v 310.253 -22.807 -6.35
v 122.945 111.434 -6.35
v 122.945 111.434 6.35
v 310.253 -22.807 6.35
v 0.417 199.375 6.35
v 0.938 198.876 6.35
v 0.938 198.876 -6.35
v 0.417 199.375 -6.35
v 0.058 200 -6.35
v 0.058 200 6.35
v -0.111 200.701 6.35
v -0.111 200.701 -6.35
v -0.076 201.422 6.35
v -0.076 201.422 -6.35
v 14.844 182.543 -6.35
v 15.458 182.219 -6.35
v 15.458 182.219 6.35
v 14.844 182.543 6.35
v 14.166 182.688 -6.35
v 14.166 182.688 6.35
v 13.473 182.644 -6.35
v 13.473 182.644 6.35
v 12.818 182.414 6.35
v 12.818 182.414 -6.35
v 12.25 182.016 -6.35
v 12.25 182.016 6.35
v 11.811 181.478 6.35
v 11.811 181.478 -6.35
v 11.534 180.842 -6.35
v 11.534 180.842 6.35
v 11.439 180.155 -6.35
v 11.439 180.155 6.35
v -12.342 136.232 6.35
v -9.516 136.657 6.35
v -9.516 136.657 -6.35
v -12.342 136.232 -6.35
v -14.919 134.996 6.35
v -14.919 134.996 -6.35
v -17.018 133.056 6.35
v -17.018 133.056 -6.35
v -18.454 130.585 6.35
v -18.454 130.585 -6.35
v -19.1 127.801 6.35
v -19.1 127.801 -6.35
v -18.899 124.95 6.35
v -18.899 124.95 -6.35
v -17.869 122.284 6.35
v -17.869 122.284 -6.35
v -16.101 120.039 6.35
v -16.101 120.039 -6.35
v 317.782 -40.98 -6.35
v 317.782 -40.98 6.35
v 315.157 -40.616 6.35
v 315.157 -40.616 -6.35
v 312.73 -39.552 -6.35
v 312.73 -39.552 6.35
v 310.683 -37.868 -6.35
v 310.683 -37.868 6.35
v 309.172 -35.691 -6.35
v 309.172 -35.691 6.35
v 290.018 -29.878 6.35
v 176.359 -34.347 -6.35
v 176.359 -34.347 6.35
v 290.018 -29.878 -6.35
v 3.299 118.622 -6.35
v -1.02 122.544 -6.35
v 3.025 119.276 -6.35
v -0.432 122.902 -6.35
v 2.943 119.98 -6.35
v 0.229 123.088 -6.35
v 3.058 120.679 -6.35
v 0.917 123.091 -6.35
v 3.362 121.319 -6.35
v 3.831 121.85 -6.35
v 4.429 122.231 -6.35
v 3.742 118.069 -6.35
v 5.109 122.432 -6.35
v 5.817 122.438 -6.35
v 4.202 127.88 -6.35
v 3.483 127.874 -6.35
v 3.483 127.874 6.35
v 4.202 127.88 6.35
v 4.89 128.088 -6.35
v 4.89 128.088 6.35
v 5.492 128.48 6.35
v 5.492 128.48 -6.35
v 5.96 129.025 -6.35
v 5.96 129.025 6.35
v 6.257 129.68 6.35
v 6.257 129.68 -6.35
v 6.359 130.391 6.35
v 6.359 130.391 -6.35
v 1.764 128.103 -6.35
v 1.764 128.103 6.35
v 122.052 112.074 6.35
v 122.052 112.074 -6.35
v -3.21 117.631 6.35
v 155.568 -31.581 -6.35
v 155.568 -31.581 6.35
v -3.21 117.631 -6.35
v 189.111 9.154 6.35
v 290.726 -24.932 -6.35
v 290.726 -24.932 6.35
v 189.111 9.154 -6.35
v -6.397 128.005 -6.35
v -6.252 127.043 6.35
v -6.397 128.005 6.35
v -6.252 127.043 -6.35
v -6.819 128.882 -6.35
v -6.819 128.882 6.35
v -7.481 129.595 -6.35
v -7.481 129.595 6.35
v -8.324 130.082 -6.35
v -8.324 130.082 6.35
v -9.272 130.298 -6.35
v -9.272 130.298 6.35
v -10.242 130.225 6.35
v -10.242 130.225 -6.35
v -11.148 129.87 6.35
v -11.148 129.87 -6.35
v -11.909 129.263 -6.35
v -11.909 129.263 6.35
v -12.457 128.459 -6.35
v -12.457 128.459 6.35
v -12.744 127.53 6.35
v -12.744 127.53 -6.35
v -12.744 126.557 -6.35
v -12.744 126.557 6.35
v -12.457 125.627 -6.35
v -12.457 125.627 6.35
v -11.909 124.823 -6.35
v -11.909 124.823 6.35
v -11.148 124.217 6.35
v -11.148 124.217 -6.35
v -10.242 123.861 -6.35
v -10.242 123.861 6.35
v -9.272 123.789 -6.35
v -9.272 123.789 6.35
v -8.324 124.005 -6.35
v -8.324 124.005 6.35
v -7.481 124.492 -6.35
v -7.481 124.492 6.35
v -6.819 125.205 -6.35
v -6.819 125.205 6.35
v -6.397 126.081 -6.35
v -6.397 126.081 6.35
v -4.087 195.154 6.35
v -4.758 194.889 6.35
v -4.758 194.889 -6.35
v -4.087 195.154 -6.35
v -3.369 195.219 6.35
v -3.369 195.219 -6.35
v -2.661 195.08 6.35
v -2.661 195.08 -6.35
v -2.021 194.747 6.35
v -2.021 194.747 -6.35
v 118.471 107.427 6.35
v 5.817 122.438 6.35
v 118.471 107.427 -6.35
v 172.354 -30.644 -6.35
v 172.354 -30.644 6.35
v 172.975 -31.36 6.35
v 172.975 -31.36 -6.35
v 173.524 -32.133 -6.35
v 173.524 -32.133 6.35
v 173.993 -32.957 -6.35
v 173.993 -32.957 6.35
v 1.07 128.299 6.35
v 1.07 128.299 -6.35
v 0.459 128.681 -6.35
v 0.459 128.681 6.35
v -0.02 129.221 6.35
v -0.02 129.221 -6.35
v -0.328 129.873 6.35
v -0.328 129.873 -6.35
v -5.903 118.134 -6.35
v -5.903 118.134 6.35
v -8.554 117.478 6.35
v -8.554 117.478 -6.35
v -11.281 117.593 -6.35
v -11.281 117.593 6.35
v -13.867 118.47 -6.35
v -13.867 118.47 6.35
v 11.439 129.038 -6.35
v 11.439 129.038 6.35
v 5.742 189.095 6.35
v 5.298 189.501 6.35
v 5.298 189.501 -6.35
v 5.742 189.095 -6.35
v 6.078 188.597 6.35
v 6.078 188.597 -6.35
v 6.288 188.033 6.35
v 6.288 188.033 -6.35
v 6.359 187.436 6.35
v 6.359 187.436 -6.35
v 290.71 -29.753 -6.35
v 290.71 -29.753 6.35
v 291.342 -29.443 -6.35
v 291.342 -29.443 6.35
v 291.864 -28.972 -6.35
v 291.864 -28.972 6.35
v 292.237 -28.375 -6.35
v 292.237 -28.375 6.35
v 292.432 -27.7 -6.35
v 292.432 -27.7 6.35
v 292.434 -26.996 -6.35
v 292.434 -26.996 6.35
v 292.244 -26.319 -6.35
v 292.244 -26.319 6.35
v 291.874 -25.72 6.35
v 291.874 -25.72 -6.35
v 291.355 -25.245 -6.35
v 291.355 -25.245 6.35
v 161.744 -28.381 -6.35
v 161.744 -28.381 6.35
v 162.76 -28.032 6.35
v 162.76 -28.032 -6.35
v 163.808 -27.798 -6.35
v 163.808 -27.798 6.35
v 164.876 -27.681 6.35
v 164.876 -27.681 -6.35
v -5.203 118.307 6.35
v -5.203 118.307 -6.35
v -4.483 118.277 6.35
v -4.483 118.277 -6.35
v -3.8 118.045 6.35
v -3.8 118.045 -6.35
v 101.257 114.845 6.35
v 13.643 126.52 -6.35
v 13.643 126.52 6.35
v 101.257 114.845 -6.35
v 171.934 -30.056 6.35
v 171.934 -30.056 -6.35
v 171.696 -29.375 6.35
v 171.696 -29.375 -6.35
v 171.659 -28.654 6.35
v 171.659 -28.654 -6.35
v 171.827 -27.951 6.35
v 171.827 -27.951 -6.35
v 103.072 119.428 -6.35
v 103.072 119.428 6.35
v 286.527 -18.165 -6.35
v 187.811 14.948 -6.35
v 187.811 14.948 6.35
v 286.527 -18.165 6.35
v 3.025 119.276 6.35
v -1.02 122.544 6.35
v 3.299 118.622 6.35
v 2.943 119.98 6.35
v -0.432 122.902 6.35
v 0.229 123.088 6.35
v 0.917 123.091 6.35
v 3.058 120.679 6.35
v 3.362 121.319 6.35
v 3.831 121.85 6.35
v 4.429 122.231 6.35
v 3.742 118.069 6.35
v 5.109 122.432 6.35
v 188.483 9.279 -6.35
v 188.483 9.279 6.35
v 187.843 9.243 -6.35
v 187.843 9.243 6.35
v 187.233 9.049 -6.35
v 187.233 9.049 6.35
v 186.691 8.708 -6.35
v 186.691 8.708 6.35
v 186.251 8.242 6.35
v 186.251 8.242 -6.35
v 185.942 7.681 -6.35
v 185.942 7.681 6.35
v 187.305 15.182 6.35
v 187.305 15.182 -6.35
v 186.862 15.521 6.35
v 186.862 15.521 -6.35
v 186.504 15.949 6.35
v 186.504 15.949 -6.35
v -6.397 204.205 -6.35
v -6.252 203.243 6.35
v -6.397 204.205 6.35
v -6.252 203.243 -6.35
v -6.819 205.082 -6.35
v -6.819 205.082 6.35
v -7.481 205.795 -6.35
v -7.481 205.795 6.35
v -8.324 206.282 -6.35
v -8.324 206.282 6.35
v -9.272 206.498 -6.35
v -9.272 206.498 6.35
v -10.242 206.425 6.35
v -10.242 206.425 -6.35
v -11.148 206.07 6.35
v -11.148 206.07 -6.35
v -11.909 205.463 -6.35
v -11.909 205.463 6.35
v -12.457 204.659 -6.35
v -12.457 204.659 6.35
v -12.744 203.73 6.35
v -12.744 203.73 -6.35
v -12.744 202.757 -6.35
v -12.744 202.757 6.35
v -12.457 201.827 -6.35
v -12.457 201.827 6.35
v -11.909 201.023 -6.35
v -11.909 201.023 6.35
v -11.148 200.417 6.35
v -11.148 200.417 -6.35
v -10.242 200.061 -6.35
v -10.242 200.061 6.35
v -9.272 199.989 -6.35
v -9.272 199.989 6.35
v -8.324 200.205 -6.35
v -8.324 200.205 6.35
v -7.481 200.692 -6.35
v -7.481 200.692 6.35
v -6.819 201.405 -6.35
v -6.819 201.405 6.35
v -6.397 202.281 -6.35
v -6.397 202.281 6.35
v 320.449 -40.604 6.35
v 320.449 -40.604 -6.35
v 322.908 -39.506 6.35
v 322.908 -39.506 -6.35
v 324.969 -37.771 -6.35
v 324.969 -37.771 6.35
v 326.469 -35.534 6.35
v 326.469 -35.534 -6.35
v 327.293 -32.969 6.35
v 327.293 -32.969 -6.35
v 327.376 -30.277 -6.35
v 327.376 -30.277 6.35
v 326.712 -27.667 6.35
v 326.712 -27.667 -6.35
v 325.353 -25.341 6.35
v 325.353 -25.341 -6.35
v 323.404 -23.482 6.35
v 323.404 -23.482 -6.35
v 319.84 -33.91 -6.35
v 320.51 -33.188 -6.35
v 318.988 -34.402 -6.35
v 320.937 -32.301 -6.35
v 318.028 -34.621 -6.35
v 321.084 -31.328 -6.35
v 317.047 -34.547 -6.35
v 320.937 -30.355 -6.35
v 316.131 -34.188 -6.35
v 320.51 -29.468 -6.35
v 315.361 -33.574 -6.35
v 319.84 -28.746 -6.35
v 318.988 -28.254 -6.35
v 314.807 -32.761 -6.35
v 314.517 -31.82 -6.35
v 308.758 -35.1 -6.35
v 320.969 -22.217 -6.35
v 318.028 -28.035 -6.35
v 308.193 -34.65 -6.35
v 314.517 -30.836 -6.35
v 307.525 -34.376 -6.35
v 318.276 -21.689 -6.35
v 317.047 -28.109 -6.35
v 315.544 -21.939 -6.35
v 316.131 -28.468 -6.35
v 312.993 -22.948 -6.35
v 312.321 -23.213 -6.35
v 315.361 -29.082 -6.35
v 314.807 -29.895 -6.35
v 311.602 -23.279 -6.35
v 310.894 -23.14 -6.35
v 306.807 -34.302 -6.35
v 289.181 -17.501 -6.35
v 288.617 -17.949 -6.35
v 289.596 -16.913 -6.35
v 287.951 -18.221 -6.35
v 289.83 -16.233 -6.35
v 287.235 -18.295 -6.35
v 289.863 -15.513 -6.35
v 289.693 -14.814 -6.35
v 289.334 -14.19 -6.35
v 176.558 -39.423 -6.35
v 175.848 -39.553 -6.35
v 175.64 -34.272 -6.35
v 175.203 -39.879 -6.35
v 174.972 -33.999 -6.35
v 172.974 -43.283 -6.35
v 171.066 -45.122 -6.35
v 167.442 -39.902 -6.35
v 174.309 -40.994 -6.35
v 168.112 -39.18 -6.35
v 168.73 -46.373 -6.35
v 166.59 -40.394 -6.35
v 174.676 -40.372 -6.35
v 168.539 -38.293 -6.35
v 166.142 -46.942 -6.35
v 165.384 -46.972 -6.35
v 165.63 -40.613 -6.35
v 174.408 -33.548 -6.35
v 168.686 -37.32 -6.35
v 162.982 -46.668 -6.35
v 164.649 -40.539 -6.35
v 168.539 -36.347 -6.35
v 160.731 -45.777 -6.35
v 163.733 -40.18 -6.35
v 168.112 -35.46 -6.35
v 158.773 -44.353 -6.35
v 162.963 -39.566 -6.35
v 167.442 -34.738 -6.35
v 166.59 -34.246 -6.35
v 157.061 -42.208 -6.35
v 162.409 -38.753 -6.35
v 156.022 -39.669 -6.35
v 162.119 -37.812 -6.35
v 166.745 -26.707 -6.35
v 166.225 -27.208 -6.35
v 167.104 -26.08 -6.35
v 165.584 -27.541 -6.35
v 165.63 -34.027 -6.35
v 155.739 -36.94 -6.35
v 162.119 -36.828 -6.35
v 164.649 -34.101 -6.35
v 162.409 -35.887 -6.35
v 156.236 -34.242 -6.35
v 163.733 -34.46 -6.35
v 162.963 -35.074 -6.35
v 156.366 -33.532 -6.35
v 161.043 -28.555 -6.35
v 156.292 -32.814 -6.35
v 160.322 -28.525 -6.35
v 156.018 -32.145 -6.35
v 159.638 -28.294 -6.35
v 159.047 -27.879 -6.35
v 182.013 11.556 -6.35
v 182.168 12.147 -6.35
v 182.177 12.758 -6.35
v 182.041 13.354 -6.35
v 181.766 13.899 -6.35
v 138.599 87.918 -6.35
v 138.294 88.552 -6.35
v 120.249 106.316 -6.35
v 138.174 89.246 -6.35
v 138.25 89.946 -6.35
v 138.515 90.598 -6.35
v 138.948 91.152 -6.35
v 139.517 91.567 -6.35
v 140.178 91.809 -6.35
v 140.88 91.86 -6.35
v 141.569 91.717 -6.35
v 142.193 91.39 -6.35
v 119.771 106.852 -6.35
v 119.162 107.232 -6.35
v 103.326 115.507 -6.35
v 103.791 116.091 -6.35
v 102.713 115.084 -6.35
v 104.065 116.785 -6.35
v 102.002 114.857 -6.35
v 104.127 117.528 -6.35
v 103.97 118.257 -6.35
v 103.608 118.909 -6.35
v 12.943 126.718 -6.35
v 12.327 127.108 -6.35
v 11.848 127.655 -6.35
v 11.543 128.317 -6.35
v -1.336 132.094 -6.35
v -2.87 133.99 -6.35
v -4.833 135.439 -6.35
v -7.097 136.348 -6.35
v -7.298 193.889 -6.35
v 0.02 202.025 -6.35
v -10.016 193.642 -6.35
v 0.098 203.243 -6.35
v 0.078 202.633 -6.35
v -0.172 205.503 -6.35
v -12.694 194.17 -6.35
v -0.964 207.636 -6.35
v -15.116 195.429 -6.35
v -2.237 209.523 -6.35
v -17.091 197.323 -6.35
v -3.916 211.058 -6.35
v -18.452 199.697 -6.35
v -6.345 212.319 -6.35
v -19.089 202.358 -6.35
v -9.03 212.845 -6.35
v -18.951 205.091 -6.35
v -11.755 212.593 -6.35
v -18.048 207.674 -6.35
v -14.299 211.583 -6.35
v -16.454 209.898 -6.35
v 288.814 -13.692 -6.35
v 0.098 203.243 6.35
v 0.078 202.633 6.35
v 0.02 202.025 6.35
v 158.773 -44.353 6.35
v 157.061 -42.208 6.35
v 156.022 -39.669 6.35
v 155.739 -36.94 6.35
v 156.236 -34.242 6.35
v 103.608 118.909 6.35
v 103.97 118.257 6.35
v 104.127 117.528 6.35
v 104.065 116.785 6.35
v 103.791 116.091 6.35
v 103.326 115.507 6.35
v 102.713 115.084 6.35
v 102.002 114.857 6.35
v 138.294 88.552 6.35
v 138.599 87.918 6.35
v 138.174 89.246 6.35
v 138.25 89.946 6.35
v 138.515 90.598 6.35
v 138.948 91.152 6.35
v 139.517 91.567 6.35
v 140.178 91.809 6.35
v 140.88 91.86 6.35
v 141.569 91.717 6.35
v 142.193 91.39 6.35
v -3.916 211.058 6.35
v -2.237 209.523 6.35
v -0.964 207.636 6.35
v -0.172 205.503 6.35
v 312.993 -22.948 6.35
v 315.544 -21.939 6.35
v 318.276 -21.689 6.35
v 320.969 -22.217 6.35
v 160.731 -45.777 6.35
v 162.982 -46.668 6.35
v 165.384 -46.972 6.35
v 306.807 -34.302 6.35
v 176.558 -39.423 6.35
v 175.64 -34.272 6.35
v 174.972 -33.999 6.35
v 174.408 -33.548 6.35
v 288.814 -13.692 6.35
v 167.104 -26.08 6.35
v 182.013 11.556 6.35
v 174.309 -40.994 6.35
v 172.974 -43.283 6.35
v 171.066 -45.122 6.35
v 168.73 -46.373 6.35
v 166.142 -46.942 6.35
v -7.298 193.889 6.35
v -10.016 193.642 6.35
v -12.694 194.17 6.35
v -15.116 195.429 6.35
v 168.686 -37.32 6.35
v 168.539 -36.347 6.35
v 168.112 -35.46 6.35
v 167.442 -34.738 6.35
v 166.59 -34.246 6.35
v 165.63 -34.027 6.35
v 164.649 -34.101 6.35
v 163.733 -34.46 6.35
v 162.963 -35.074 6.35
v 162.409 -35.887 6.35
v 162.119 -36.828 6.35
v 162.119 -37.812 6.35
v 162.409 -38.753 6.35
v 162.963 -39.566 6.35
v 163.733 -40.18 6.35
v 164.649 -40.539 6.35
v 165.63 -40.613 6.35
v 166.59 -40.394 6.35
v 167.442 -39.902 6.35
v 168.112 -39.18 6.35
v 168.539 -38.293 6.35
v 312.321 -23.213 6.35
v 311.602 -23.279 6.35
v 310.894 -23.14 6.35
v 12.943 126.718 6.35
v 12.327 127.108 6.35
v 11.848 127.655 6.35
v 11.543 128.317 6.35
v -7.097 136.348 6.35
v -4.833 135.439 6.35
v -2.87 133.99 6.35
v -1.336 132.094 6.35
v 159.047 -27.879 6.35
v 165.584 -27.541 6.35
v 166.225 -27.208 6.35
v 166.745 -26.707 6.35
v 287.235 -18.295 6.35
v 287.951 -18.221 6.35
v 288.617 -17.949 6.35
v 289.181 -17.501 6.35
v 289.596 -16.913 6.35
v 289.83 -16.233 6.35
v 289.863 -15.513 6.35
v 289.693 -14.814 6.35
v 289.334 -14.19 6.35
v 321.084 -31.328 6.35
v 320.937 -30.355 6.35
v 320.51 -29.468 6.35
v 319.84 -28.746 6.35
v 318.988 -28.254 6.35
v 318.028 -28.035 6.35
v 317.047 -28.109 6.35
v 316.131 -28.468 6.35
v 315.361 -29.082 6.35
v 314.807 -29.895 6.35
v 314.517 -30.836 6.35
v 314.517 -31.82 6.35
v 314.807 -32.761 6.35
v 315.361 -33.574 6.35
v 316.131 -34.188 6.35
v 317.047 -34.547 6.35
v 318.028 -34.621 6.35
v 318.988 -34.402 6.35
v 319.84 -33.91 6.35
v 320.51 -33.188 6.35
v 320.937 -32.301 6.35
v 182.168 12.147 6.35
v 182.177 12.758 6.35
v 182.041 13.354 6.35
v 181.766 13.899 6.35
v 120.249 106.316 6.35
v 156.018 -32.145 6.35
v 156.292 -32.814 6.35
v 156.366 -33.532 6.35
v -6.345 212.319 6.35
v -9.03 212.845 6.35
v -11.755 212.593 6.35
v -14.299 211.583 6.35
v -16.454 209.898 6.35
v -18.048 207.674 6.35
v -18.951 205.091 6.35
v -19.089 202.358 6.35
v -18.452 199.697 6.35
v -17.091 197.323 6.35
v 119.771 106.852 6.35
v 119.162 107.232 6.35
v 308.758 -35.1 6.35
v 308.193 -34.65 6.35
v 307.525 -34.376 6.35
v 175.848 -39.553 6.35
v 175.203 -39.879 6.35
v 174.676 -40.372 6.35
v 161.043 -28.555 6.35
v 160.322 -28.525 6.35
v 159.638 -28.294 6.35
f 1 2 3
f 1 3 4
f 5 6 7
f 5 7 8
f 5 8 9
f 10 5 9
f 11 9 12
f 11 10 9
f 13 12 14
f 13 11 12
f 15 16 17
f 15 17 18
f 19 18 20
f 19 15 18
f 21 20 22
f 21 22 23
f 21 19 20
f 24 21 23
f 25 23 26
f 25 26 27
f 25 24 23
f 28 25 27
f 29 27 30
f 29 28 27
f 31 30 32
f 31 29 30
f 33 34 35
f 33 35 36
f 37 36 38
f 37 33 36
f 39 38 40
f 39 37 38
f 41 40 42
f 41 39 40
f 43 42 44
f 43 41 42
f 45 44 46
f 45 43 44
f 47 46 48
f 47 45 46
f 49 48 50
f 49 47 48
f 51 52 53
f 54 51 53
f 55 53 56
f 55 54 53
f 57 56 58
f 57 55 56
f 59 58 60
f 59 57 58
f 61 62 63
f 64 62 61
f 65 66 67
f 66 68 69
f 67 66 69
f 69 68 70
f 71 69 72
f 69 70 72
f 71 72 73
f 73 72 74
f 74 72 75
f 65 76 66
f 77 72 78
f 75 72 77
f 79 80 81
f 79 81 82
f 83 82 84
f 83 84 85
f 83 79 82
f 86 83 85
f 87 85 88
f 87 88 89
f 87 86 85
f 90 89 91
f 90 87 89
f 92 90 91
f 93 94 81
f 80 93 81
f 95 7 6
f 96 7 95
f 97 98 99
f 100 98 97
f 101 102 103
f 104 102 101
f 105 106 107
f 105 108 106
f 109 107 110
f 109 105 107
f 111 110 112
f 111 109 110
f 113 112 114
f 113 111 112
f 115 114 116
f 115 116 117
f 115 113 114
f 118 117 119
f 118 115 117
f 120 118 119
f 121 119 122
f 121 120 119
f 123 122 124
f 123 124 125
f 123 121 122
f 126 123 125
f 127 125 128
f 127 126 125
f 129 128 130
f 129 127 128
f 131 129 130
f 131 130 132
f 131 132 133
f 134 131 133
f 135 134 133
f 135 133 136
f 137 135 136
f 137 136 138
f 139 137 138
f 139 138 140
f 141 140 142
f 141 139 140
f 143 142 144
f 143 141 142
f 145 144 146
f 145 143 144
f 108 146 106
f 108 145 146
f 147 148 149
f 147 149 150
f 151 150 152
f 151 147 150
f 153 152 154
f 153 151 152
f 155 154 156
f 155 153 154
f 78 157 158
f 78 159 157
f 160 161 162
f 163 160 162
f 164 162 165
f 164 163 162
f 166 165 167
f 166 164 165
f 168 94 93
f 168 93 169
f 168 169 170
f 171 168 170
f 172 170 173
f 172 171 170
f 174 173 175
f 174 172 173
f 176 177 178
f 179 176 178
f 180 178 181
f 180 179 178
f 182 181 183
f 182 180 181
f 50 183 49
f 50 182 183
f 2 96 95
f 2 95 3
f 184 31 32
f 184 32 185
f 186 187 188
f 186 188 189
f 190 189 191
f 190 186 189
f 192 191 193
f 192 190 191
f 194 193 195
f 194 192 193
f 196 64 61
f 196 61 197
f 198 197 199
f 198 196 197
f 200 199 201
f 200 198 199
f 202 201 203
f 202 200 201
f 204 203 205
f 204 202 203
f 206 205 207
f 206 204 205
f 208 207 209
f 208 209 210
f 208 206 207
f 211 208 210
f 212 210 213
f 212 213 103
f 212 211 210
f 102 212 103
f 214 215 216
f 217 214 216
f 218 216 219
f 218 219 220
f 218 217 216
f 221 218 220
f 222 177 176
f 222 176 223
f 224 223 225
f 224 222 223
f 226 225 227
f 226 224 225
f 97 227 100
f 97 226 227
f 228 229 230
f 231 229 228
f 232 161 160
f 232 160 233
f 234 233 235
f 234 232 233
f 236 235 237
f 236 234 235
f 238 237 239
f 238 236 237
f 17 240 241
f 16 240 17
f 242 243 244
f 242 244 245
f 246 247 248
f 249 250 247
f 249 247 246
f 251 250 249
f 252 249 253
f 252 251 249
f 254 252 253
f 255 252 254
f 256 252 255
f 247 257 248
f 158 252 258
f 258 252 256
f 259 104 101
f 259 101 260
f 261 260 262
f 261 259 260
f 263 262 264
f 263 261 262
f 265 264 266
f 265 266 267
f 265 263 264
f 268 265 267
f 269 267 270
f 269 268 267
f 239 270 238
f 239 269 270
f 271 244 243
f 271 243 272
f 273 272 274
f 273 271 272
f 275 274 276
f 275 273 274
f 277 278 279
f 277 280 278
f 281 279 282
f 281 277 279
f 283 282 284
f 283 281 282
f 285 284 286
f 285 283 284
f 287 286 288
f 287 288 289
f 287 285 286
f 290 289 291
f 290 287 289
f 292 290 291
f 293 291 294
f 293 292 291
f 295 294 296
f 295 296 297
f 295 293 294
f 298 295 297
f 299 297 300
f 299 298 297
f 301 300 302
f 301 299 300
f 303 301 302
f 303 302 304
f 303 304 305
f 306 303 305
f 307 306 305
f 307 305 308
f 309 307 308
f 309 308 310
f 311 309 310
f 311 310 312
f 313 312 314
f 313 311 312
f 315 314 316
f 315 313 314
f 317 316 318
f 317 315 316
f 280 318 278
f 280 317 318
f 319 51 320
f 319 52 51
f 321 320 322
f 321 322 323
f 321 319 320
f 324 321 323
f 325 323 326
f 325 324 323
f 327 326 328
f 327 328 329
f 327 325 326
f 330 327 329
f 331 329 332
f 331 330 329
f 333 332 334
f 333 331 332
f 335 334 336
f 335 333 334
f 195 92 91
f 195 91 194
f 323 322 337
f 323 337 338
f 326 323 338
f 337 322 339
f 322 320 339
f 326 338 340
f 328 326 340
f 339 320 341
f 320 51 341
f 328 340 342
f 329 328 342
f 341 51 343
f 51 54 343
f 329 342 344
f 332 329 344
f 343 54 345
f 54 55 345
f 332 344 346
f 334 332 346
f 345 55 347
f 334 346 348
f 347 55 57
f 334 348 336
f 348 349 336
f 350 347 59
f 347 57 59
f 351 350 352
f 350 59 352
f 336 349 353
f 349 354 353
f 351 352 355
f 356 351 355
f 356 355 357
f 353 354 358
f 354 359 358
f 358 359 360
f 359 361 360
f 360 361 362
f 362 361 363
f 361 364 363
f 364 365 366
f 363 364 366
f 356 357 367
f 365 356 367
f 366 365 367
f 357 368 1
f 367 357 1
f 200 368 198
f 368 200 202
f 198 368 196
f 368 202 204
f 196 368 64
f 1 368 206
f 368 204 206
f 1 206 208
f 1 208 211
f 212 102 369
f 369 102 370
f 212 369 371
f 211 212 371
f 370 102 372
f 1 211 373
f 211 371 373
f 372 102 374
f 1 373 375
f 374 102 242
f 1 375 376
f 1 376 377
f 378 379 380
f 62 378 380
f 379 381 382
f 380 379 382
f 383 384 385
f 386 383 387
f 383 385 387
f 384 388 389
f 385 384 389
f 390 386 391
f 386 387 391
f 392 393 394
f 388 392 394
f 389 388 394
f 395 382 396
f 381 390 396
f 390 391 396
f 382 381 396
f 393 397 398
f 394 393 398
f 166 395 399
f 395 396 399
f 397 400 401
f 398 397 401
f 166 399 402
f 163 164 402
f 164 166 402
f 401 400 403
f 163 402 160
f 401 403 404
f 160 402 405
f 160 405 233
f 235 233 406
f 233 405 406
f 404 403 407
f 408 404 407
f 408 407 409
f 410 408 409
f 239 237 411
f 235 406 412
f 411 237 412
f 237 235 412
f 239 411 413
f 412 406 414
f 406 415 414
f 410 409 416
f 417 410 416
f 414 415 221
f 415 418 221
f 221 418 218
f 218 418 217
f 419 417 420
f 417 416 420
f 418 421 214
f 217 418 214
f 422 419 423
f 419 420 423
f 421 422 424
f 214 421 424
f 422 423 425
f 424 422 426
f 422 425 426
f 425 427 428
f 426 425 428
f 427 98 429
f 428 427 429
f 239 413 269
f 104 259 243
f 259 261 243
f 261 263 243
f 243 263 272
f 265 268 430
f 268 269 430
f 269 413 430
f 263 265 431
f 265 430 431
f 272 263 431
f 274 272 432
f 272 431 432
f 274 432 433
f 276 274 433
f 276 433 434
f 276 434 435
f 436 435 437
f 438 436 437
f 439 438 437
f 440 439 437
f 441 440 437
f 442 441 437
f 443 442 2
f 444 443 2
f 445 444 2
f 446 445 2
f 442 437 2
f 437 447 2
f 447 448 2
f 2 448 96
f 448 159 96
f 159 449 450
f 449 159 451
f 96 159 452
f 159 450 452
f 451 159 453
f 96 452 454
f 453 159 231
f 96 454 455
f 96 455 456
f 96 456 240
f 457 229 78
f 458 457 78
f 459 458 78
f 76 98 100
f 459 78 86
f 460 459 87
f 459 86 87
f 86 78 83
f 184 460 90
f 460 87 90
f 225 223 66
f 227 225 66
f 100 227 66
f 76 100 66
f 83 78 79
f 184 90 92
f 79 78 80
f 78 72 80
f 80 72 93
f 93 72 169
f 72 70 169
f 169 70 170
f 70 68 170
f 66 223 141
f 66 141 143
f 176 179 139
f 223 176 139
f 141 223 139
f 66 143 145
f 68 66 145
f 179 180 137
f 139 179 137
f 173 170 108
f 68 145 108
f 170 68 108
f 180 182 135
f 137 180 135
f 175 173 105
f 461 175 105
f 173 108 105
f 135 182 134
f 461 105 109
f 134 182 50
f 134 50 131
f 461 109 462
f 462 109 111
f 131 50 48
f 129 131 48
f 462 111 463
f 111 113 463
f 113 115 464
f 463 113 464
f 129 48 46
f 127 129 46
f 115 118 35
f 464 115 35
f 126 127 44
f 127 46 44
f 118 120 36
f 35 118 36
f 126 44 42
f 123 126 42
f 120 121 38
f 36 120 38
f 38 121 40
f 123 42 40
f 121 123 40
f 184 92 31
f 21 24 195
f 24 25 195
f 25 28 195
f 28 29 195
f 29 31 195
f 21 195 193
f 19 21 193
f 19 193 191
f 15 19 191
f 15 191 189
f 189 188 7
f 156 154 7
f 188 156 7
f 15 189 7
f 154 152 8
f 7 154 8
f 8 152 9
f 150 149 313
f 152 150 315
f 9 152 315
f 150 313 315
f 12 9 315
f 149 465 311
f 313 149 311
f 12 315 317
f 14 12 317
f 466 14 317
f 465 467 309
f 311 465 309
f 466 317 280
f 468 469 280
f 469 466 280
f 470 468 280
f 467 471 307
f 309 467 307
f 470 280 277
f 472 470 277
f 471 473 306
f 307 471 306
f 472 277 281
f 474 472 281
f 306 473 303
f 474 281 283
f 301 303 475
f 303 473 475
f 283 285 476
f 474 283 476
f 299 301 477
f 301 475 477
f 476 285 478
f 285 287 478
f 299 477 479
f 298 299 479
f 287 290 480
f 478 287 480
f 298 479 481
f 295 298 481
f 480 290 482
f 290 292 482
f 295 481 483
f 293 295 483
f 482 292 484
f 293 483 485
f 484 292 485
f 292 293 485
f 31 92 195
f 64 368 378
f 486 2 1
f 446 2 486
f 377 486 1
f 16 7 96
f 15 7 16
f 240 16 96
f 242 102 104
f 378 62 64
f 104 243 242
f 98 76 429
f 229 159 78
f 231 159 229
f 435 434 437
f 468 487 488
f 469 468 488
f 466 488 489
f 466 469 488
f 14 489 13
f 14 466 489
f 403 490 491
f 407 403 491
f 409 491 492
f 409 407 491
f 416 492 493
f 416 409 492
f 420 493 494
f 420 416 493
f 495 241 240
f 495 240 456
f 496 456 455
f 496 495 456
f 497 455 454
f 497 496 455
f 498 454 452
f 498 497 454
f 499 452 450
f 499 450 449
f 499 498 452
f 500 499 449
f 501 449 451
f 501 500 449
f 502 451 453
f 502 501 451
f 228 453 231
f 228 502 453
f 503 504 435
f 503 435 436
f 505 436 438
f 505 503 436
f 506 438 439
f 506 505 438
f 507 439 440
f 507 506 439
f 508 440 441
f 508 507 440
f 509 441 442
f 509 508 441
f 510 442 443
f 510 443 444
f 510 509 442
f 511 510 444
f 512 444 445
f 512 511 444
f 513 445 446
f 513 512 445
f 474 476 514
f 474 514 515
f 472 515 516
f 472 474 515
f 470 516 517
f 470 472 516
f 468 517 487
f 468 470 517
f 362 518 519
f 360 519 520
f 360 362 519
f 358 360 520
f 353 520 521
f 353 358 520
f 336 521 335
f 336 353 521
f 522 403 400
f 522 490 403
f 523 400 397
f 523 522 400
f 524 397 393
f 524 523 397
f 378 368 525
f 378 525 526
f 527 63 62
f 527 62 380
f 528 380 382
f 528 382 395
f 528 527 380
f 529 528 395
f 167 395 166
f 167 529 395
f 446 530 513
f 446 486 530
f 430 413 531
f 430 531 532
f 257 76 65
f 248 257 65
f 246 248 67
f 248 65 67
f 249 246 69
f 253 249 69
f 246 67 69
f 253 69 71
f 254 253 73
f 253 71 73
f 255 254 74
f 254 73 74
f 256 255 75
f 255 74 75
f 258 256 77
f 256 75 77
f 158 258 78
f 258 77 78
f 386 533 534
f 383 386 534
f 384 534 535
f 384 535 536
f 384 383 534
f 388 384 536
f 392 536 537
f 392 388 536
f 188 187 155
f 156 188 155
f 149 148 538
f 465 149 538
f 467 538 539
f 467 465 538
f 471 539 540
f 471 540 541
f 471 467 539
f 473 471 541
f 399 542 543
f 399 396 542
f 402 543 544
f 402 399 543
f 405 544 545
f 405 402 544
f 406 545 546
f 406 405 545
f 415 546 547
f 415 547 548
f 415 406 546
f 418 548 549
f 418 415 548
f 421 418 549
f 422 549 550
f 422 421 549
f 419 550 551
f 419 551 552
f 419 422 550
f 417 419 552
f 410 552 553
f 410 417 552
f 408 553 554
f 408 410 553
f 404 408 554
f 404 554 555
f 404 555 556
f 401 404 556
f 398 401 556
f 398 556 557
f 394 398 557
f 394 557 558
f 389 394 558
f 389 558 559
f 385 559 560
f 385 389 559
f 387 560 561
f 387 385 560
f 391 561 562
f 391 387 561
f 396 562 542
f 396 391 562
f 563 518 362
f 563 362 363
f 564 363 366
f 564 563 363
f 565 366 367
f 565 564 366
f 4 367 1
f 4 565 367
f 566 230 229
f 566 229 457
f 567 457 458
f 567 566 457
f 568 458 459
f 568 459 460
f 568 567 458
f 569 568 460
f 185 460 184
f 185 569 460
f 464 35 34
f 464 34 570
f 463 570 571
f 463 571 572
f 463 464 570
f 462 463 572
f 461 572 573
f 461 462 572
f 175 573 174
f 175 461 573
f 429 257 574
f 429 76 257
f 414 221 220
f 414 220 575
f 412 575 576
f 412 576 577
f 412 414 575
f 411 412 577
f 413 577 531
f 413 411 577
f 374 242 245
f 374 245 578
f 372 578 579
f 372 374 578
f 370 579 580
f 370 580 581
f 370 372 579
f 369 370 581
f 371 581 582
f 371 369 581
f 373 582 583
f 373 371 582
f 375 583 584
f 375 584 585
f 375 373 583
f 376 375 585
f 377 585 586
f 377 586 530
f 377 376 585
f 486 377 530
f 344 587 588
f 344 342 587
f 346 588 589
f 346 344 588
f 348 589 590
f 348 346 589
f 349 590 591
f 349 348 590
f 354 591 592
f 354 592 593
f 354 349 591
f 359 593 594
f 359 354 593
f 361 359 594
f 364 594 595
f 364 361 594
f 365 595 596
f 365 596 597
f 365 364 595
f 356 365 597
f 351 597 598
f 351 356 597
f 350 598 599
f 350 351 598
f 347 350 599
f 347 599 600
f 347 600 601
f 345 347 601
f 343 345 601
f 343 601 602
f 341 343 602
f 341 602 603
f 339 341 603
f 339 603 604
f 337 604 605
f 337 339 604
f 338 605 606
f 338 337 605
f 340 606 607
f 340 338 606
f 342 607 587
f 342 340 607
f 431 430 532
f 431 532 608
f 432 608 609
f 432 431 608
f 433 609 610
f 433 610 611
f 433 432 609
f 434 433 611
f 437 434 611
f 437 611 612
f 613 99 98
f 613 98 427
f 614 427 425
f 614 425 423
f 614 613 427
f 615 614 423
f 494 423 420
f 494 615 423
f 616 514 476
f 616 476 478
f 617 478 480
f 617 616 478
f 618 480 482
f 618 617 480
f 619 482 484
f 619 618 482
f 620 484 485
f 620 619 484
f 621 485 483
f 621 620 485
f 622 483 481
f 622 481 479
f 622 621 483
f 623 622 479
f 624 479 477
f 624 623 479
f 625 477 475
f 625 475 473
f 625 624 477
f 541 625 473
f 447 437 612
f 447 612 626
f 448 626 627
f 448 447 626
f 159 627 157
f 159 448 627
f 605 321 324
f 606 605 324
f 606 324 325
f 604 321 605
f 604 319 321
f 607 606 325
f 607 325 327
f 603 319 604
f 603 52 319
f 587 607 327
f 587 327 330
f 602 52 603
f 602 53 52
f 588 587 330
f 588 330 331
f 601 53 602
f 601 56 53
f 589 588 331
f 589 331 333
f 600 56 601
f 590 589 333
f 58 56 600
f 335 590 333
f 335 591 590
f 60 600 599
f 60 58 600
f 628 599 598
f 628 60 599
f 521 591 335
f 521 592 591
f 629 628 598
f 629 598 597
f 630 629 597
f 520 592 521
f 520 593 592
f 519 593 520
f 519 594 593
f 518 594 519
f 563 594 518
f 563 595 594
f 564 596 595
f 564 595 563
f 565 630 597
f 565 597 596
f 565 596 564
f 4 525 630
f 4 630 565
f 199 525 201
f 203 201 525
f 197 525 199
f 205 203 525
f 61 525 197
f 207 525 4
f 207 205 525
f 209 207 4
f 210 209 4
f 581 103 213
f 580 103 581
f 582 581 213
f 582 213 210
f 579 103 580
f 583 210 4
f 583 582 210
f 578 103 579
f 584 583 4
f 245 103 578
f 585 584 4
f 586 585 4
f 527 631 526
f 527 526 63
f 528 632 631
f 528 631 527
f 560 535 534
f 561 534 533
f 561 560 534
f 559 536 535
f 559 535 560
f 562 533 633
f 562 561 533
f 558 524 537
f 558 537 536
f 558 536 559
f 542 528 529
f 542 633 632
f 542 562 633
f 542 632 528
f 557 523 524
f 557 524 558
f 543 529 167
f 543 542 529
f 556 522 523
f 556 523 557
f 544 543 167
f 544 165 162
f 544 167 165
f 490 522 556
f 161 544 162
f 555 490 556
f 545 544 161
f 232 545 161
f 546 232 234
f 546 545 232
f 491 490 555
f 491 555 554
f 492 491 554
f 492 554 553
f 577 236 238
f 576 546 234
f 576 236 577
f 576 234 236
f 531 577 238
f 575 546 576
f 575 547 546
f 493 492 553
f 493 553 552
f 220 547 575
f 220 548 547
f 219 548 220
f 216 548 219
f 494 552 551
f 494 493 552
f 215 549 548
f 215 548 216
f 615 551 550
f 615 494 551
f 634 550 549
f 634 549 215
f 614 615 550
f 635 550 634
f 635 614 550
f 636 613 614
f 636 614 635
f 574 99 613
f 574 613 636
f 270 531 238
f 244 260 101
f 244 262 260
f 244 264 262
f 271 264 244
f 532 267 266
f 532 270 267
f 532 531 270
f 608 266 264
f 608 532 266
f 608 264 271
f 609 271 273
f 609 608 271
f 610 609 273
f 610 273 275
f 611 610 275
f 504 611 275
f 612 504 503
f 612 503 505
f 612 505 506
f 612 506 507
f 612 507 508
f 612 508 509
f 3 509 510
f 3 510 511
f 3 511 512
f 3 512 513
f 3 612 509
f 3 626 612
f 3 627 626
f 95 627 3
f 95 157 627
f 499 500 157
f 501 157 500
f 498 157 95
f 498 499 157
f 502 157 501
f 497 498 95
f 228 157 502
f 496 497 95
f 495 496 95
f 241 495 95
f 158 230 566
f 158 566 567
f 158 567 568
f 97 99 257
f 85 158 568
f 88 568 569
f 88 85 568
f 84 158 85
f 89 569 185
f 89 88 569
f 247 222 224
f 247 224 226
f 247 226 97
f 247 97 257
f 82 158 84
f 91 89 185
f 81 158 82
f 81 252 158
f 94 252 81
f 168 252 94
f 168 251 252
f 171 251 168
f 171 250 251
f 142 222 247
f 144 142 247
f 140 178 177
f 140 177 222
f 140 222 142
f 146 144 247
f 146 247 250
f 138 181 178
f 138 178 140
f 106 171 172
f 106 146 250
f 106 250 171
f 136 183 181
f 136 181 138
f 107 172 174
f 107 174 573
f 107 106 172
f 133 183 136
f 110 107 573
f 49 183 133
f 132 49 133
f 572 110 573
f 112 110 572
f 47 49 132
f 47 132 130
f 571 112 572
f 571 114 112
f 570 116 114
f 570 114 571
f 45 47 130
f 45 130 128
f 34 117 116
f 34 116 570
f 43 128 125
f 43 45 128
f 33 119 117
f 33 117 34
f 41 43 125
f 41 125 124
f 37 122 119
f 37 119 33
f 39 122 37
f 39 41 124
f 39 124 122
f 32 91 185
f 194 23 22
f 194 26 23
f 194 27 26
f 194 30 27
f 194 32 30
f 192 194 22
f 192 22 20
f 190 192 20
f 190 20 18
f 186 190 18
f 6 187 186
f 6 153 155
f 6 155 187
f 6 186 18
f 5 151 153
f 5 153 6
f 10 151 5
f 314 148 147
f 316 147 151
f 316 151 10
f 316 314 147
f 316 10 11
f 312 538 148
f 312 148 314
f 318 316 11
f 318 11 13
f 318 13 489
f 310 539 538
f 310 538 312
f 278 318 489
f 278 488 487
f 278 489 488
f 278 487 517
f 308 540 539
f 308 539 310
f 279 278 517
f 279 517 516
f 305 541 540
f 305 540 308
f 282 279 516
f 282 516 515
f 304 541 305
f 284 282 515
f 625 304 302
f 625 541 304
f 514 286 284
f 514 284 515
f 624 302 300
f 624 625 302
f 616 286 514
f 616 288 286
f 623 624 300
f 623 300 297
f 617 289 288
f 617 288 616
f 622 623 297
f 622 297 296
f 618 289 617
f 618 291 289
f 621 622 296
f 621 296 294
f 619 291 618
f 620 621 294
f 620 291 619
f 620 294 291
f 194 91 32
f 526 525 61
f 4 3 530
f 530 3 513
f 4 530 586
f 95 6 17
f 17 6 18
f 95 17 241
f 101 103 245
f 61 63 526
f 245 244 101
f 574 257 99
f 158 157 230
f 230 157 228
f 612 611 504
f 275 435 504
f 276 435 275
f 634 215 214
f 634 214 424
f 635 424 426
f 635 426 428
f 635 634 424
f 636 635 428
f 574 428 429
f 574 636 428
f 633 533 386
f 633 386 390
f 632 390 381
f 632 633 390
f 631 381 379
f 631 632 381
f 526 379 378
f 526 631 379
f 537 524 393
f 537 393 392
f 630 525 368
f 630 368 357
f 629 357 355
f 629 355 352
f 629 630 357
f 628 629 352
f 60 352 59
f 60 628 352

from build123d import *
from build123d.topology import SkipClean

# Parameters (mm, degrees)
SKETCH1_R               = 3.2639
SKETCH1_R_2             = 3.302
BOSS_EXTRUDE1_DEPTH     = 6.35
FILLET1_R               = 6.35
CUT_EXTRUDE1_DEPTH      = 391.591036161
CUT_EXTRUDE1_DEPTH_BACK = 391.591036161
FILLET2_R               = 2.54
FILLET3_START           = -6.35
FILLET3_DEPTH           = 12.7


with BuildPart() as part:
    # Sketch1 → Boss-Extrude1 (new, symmetric)
    with BuildSketch(Plane.XY):
        with BuildLine():
            Line((323.403565347, -23.482283069), (-3.916489287, 211.058114043))
            ThreePointArc((-3.916489287, 211.058114043), (-17.330936491, 208.842994945), (-15.115817393, 195.42854774))
            Line((-15.115817393, 195.42854774), (6.35884666, 180.040928914))
            Line((6.35884666, 180.040928914), (6.35884666, 136.657230892))
            Line((6.35884666, 136.657230892), (-9.51615334, 136.657230892))
            ThreePointArc((-9.51615334, 136.657230892), (-18.453997349, 130.584802008), (-16.101018255, 120.038573419))
            Line((-16.101018255, 120.038573419), (158.772752683, -44.352579771))
            ThreePointArc((158.772752683, -44.352579771), (161.828207487, -46.293327152), (165.383713496, -46.97206236))
            Line((165.383713496, -46.97206236), (317.781709759, -40.9800363))
            ThreePointArc((317.781709759, -40.9800363), (326.971059958, -34.280483913), (323.403565347, -23.482283069))
        make_face()
        with Locations((-9.51615334, 203.243330892)):
            Circle(SKETCH1_R, mode=Mode.SUBTRACT)
        with Locations((317.781709759, -31.3280363)):
            Circle(SKETCH1_R_2, mode=Mode.SUBTRACT)
        with Locations((165.383713496, -37.32006236)):
            Circle(SKETCH1_R_2, mode=Mode.SUBTRACT)
        with Locations((-9.51615334, 127.043330892)):
            Circle(SKETCH1_R, mode=Mode.SUBTRACT)
    extrude(amount=BOSS_EXTRUDE1_DEPTH, both=True)

    # Fillet1
    fillet1_edges = [part.edges().sort_by_distance(p)[0] for p in [
        (6.35884666, 136.657230892, 0),
        (6.35884666, 180.040928914, 0),
    ]]
    fillet(fillet1_edges, radius=FILLET1_R)

    # Sketch3 → Cut-Extrude1 (cut, two sides: drawn at the far end of the back side and taken through both)
    with SkipClean():  # the faces are left unmerged after this step: merging them gives an invalid solid
        with BuildSketch(Plane.XY.offset(-CUT_EXTRUDE1_DEPTH_BACK)):
            with BuildLine():
                ThreePointArc((3.707435863, 181.940790938), (5.657233219, 179.680529676), (6.35884666, 176.779111181))
                Line((6.35884666, 176.779111181), (6.35884666, 188.740894591))
                Line((6.35884666, 188.740894591), (-3.45918948, 195.777390763))
                ThreePointArc((-3.45918948, 195.777390763), (-9.228570931, 193.633733108), (-15.115817393, 195.42854774))
                Line((-15.115817393, 195.42854774), (3.707435863, 181.940790938))
            make_face()
            with BuildLine():
                ThreePointArc((0.09774666, 203.243330892), (-0.052851391, 201.548341381), (-0.499927425, 199.90645459))
                Line((-0.499927425, 199.90645459), (122.05229066, 112.074407425))
                Line((122.05229066, 112.074407425), (122.945240738, 111.43443832))
                Line((122.945240738, 111.43443832), (311.692641772, -23.839087438))
                ThreePointArc((311.692641772, -23.839087438), (317.487772358, -21.680513052), (323.403565347, -23.482283069))
                Line((323.403565347, -23.482283069), (-3.916489287, 211.058114043))
                ThreePointArc((-3.916489287, 211.058114043), (-0.96449609, 207.636078493), (0.09774666, 203.243330892))
            make_face()
            Polygon((111.340098755, 113.501797091), (11.43884666, 185.10010533), (11.43884666, 126.813546556), align=None)
            with BuildLine():
                Line((119.611598008, 107.274727388), (-0.660580828, 123.300884005))
                ThreePointArc((-0.660580828, 123.300884005), (-0.831975536, 122.91875466), (-1.019850221, 122.544452529))
                Line((-1.019850221, 122.544452529), (160.337493151, -29.092258022))
                ThreePointArc((160.337493151, -29.092258022), (163.280736167, -27.8999461), (166.451617397, -27.727321081))
                Line((166.451617397, -27.727321081), (182.502514914, 12.79242434))
                Line((182.502514914, 12.79242434), (119.611598008, 107.274727388))
            make_face()
            with BuildLine():
                ThreePointArc((-4.498715678, 118.842575285), (-10.501957546, 117.480106369), (-16.101018255, 120.038573419))
                Line((-16.101018255, 120.038573419), (158.772752683, -44.352579771))
                ThreePointArc((158.772752683, -44.352579771), (155.861403554, -38.896995261), (156.858627693, -32.794135266))
                Line((156.858627693, -32.794135266), (-4.498715678, 118.842575285))
            make_face()
            Polygon((302.558149165, -23.542420343), (130.90056761, 99.482989028), (186.986074503, 15.224591797), align=None)
            with BuildLine():
                Line((174.588526659, -34.416182433), (303.849770217, -29.333853537))
                Line((303.849770217, -29.333853537), (186.828441546, 9.919290292))
                Line((186.828441546, 9.919290292), (171.174562899, -29.598199426))
                ThreePointArc((171.174562899, -29.598199426), (173.259036601, -31.739704846), (174.588526659, -34.416182433))
            make_face()
            with BuildLine():
                Line((166.141541896, -46.942265856), (317.781709759, -40.9800363))
                ThreePointArc((317.781709759, -40.9800363), (312.075009533, -39.112294551), (308.576896596, -34.231916227))
                Line((308.576896596, -34.231916227), (174.788109276, -39.492260326))
                ThreePointArc((174.788109276, -39.492260326), (171.68397902, -44.632227452), (166.141541896, -46.942265856))
            make_face()
            with BuildLine():
                Line((6.35884666, 127.490451859), (6.35884666, 143.007230892))
                ThreePointArc((6.35884666, 143.007230892), (4.498974721, 138.517102831), (0.00884666, 136.657230892))
                Line((0.00884666, 136.657230892), (-9.51615334, 136.657230892))
                ThreePointArc((-9.51615334, 136.657230892), (-3.191761895, 134.284128228), (0.010393998, 128.336377306))
                Line((0.010393998, 128.336377306), (6.35884666, 127.490451859))
            make_face()
        extrude(amount=CUT_EXTRUDE1_DEPTH + CUT_EXTRUDE1_DEPTH_BACK, mode=Mode.SUBTRACT)

    # Fillet2
    # the kernel refuses this fillet: 2.54 mm, written as the material it adds along each edge
    with BuildSketch(Plane(origin=(166.451617397, -27.727321081, -6.35), x_dir=(-0.9995758399845447, 0.029122845314151255, 0), z_dir=(0, 0, 1)), Plane(origin=(160.337493151, -29.092258022, 6.35), x_dir=(0.892287076417909, 0.4514684631927024, 0), z_dir=(0, 0, -1))) as fillet2_piece_1:
        with BuildLine():
            CenterArc((1.783556305, -2.531519164), FILLET2_R, 94.683397531, 65.375681648)
            Line((-0.604157454, -1.665249573), (-0.651911729, -1.647924181))
            Line((-0.651911729, -1.647924181), (-0.047754275, 0.017325392))
            Line((-0.047754275, 0.017325392), (0.004147805, 0.050630383))
            ThreePointArc((0.004147805, 0.050630383), (0.788083018, 0.018572822), (1.572018232, 0.050630383))
            Line((1.572018232, 0.050630383), (1.576166037, 0))
        make_face()
    extrude(amount=12.7)
    with BuildSketch(Plane(origin=(-0.660580828, 123.300884005, 6.35), x_dir=(0.9912388387460753, -0.13208165868633, 0), z_dir=(0, 0, -1))) as fillet2_piece_2:
        with BuildLine():
            CenterArc((1.591611282, 2.54), FILLET2_R, 223.323691948, 46.676308052)
            Line((-0.256211052, 0.797257155), (-0.293167498, 0.762402299))
            ThreePointArc((-0.293167498, 0.762402299), (-0.167784752, 0.385877038), (-0.048994959, -0.0134214))
            Line((-0.048994959, -0.0134214), (0, -0.0508))
            Line((0, -0.0508), (1.591611282, -0.0508))
            Line((1.591611282, -0.0508), (1.591611282, 0))
        make_face()
    extrude(amount=12.7)
    with BuildSketch(Plane(origin=(119.611598008, 107.274727388, -6.35), x_dir=(0.5541066503757912, -0.8324456859215024, 0), z_dir=(0, 0, 1))) as fillet2_piece_3:
        with BuildLine():
            CenterArc((FILLET2_R * 0.453208704568, -FILLET2_R), FILLET2_R, 90, 48.760894885)
            Line((-FILLET2_R * 0.298756464993, -FILLET2_R * 0.340797160377), (-FILLET2_R * 0.313795768384, -FILLET2_R * 0.327613103585))
            Line((-FILLET2_R * 0.313795768384, -FILLET2_R * 0.327613103585), (-FILLET2_R * 0.00906417409136, FILLET2_R * 0.02))
            Line((-FILLET2_R * 0.00906417409136, FILLET2_R * 0.02), (FILLET2_R * 0.453208704568, FILLET2_R * 0.02))
            Line((FILLET2_R * 0.453208704568, FILLET2_R * 0.02), (FILLET2_R * 0.453208704568, 0))
        make_face()
    extrude(amount=12.7)
    with BuildSketch(Plane(origin=(182.502514914, 12.79242434, -6.35), x_dir=(-0.36828313872345547, -0.9297136815880468, 0), z_dir=(0, 0, 1))) as fillet2_piece_4:
        with BuildLine():
            CenterArc((FILLET2_R * 0.523442888371, -FILLET2_R), FILLET2_R, 90, 55.258978007)
            Line((-FILLET2_R * 0.29829335557, -FILLET2_R * 0.430131993008), (-FILLET2_R * 0.314728080449, -FILLET2_R * 0.418734632868))
            Line((-FILLET2_R * 0.314728080449, -FILLET2_R * 0.418734632868), (-FILLET2_R * 0.0104688577674, FILLET2_R * 0.02))
            Line((-FILLET2_R * 0.0104688577674, FILLET2_R * 0.02), (FILLET2_R * 0.523442888371, FILLET2_R * 0.02))
            Line((FILLET2_R * 0.523442888371, FILLET2_R * 0.02), (FILLET2_R * 0.523442888371, 0))
        make_face()
    extrude(amount=12.7)
    with BuildSketch(Plane(origin=(156.858627693, -32.794135266, 6.35), x_dir=(-0.3952284110607686, -0.9185828776383654, 0), z_dir=(0, 0, -1)), Plane(origin=(308.576896596, -34.231916227, 6.35), x_dir=(0.37772010678860757, -0.925919824243764, 0), z_dir=(0, 0, -1)), Plane(origin=(174.588526659, -34.416182433, 6.35), x_dir=(-0.37772010678857665, 0.9259198242437766, 0), z_dir=(0, 0, -1))) as fillet2_piece_5:
        with BuildLine():
            CenterArc((1.783556305, 2.531519164), FILLET2_R, 199.940920821, 65.375681648)
            Line((-0.604157454, 1.665249573), (-0.651911729, 1.647924181))
            Line((-0.651911729, 1.647924181), (-0.047754275, -0.017325392))
            Line((-0.047754275, -0.017325392), (0.004147805, -0.050630383))
            ThreePointArc((0.004147805, -0.050630383), (0.788083018, -0.018572822), (1.572018232, -0.050630383))
            Line((1.572018232, -0.050630383), (1.576166037, 0))
        make_face()
    extrude(amount=12.7)
    with BuildSketch(Plane(origin=(-4.498715678, 118.842575285, 6.35), x_dir=(-0.8928548726360307, -0.45034450858214903, 0), z_dir=(0, 0, -1))) as fillet2_piece_6:
        with BuildLine():
            CenterArc((1.78119788, -2.531482193), FILLET2_R, 94.693600353, 65.293330113)
            Line((-0.605423151, -1.662206603), (-0.653155572, -1.644821091))
            Line((-0.653155572, -1.644821091), (-0.047732421, 0.017385512))
            Line((-0.047732421, 0.017385512), (0.004156821, 0.050629644))
            ThreePointArc((0.004156821, 0.050629644), (0.78667841, 0.018560101), (1.5692, 0.050629644))
            Line((1.5692, 0.050629644), (1.573356821, 0))
        make_face()
    extrude(amount=12.7)
    with BuildSketch(Plane(origin=(311.692641772, -23.839087438, 6.35), x_dir=(-0.812807839950294, 0.5825319006847067, 0), z_dir=(0, 0, -1)), Plane(origin=(174.788109276, -39.492260326, 6.35), x_dir=(0.9992279317494391, 0.03928791686687304, 0), z_dir=(0, 0, -1)), Plane(origin=(171.174562899, -29.598199426, 6.35), x_dir=(0.36828313872344726, 0.92971368158805, 0), z_dir=(0, 0, -1))) as fillet2_piece_7:
        with BuildLine():
            CenterArc((1.771457696, 2.54), FILLET2_R, 204.624318352, 65.375681648)
            Line((-0.537553035, 1.481666667), (-0.583733249, 1.4605))
            ThreePointArc((-0.583733249, 1.4605), (-0.286235802, 0.734499053), (-0.049009441, -0.013368421))
            Line((-0.049009441, -0.013368421), (0, -0.0508))
            Line((0, -0.0508), (1.771457696, -0.0508))
            Line((1.771457696, -0.0508), (1.771457696, 0))
        make_face()
    extrude(amount=12.7)
    with BuildSketch(Plane(origin=(-0.499927425, 199.90645459, 6.35), x_dir=(0.26918459485658613, 0.9630886012677626, 0), z_dir=(0, 0, -1)), Plane(origin=(0.010393998, 128.336377306, 6.35), x_dir=(-0.21513026066019494, 0.97658536285789, 0), z_dir=(0, 0, -1))) as fillet2_piece_8:
        with BuildLine():
            CenterArc((1.78119788, 2.531482193), FILLET2_R, 200.013069534, 65.293330113)
            Line((-0.605423151, 1.662206603), (-0.653155572, 1.644821091))
            Line((-0.653155572, 1.644821091), (-0.047732421, -0.017385512))
            Line((-0.047732421, -0.017385512), (0.004156821, -0.050629644))
            ThreePointArc((0.004156821, -0.050629644), (0.78667841, -0.018560101), (1.5692, -0.050629644))
            Line((1.5692, -0.050629644), (1.573356821, 0))
        make_face()
    extrude(amount=12.7)
    with BuildSketch(Plane(origin=(11.43884666, 185.10010533, -6.35), x_dir=(0, -1, 0), z_dir=(0, 0, 1))) as fillet2_piece_9:
        with BuildLine():
            CenterArc((FILLET2_R * 1.94699389315, FILLET2_R), FILLET2_R, 144.371179201, 125.628820799)
            Line((FILLET2_R * 1.1341860532, FILLET2_R * 1.58253190068), (FILLET2_R * 1.1179298964, FILLET2_R * 1.5941825387))
            Line((FILLET2_R * 1.1179298964, FILLET2_R * 1.5941825387), (-FILLET2_R * 0.016256156799, FILLET2_R * 0.0116506380137))
            Line((-FILLET2_R * 0.016256156799, FILLET2_R * 0.0116506380137), (0, -FILLET2_R * 0.02))
            Line((0, -FILLET2_R * 0.02), (FILLET2_R * 1.94699389315, -FILLET2_R * 0.02))
            Line((FILLET2_R * 1.94699389315, -FILLET2_R * 0.02), (FILLET2_R * 1.94699389315, 0))
        make_face()
    extrude(amount=12.7)
    with BuildSketch(Plane(origin=(111.340098755, 113.501797091, 6.35), x_dir=(-0.9912388387460684, 0.13208165868638097, 0), z_dir=(0, 0, -1))) as fillet2_piece_10:
        with BuildLine():
            CenterArc((FILLET2_R * 4.00498548007, FILLET2_R), FILLET2_R, 118.038920786, 151.961079214)
            Line((FILLET2_R * 3.53491424299, FILLET2_R * 1.88262847908), (FILLET2_R * 3.52551281825, FILLET2_R * 1.90028104866))
            Line((FILLET2_R * 3.52551281825, FILLET2_R * 1.90028104866), (-FILLET2_R * 0.00940142474147, FILLET2_R * 0.0176525695815))
            Line((-FILLET2_R * 0.00940142474147, FILLET2_R * 0.0176525695815), (0, -FILLET2_R * 0.02))
            Line((0, -FILLET2_R * 0.02), (FILLET2_R * 4.00498548007, -FILLET2_R * 0.02))
            Line((FILLET2_R * 4.00498548007, -FILLET2_R * 0.02), (FILLET2_R * 4.00498548007, 0))
        make_face()
    extrude(amount=12.7)
    with BuildSketch(Plane(origin=(11.43884666, 126.813546556, 6.35), x_dir=(0, 1, 0), z_dir=(0, 0, -1))) as fillet2_piece_11:
        with BuildLine():
            CenterArc((FILLET2_R * 0.875589522311, FILLET2_R), FILLET2_R, 187.589900013, 82.410099987)
            Line((-FILLET2_R * 0.115649316435, FILLET2_R * 0.867918341314), (-FILLET2_R * 0.13547409321, FILLET2_R * 0.86527670814))
            Line((-FILLET2_R * 0.13547409321, FILLET2_R * 0.86527670814), (-FILLET2_R * 0.0175117904462, -FILLET2_R * 0.02))
            Line((-FILLET2_R * 0.0175117904462, -FILLET2_R * 0.02), (FILLET2_R * 0.875589522311, -FILLET2_R * 0.02))
            Line((FILLET2_R * 0.875589522311, -FILLET2_R * 0.02), (FILLET2_R * 0.875589522311, 0))
        make_face()
    extrude(amount=12.7)
    with BuildSketch(Plane(origin=(6.35884666, 127.490451859, -6.35), x_dir=(-0.9912388387460678, 0.13208165868638616, 0), z_dir=(0, 0, 1))) as fillet2_piece_12:
        with BuildLine():
            CenterArc((FILLET2_R * 1.14208767296, -FILLET2_R), FILLET2_R, 90, 97.589900013)
            Line((FILLET2_R * 0.150848834209, -FILLET2_R * 1.13208165869), (FILLET2_R * 0.131024057434, -FILLET2_R * 1.13472329186))
            Line((FILLET2_R * 0.131024057434, -FILLET2_R * 1.13472329186), (-FILLET2_R * 0.0228417534591, FILLET2_R * 0.02))
            Line((-FILLET2_R * 0.0228417534591, FILLET2_R * 0.02), (FILLET2_R * 1.14208767296, FILLET2_R * 0.02))
            Line((FILLET2_R * 1.14208767296, FILLET2_R * 0.02), (FILLET2_R * 1.14208767296, 0))
        make_face()
    extrude(amount=12.7)
    with BuildSketch(Plane(origin=(130.90056761, 99.482989028, 6.35), x_dir=(0.8128078399502843, -0.5825319006847207, 0), z_dir=(0, 0, -1))) as fillet2_piece_13:
        with BuildLine():
            CenterArc((FILLET2_R * 5.46954418313, FILLET2_R), FILLET2_R, 110.721974099, 159.278025901)
            Line((FILLET2_R * 5.11571060351, FILLET2_R * 1.93530839723), (FILLET2_R * 5.10863393191, FILLET2_R * 1.95401456518))
            Line((FILLET2_R * 5.10863393191, FILLET2_R * 1.95401456518), (-FILLET2_R * 0.00707667159249, FILLET2_R * 0.0187061679446))
            Line((-FILLET2_R * 0.00707667159249, FILLET2_R * 0.0187061679446), (0, -FILLET2_R * 0.02))
            Line((0, -FILLET2_R * 0.02), (FILLET2_R * 5.46954418313, -FILLET2_R * 0.02))
            Line((FILLET2_R * 5.46954418313, -FILLET2_R * 0.02), (FILLET2_R * 5.46954418313, 0))
        make_face()
    extrude(amount=12.7)
    with BuildSketch(Plane(origin=(302.558149165, -23.542420343, -6.35), x_dir=(-0.8128078399502848, 0.5825319006847195, 0), z_dir=(0, 0, 1))) as fillet2_piece_14:
        with BuildLine():
            CenterArc((FILLET2_R * 6.65716498575, FILLET2_R), FILLET2_R, 107.08552386, 162.91447614)
            Line((FILLET2_R * 6.36336615702, FILLET2_R * 1.95586727543), (FILLET2_R * 6.35749018045, FILLET2_R * 1.97498462094))
            Line((FILLET2_R * 6.35749018045, FILLET2_R * 1.97498462094), (-FILLET2_R * 0.00587597657447, FILLET2_R * 0.0191173455086))
            Line((-FILLET2_R * 0.00587597657447, FILLET2_R * 0.0191173455086), (0, -FILLET2_R * 0.02))
            Line((0, -FILLET2_R * 0.02), (FILLET2_R * 6.65716498575, -FILLET2_R * 0.02))
            Line((FILLET2_R * 6.65716498575, -FILLET2_R * 0.02), (FILLET2_R * 6.65716498575, 0))
        make_face()
    extrude(amount=12.7)
    with BuildSketch(Plane(origin=(186.986074503, 15.224591797, 6.35), x_dir=(-0.5541066503758183, 0.8324456859214845, 0), z_dir=(0, 0, -1))) as fillet2_piece_15:
        with BuildLine():
            CenterArc((FILLET2_R * 0.34244962946, FILLET2_R), FILLET2_R, 232.192502041, 37.807497959)
            Line((-FILLET2_R * 0.270560821853, FILLET2_R * 0.209925201908), (-FILLET2_R * 0.282821030879, FILLET2_R * 0.194123705946))
            Line((-FILLET2_R * 0.282821030879, FILLET2_R * 0.194123705946), (-FILLET2_R * 0.00684899258921, -FILLET2_R * 0.02))
            Line((-FILLET2_R * 0.00684899258921, -FILLET2_R * 0.02), (FILLET2_R * 0.34244962946, -FILLET2_R * 0.02))
            Line((FILLET2_R * 0.34244962946, -FILLET2_R * 0.02), (FILLET2_R * 0.34244962946, 0))
        make_face()
    extrude(amount=12.7)
    with BuildSketch(Plane(origin=(186.828441546, 9.919290292, -6.35), x_dir=(0.9480836055378145, -0.31802118940475943, 0), z_dir=(0, 0, 1))) as fillet2_piece_16:
        with BuildLine():
            CenterArc((FILLET2_R * 0.947862650308, -FILLET2_R), FILLET2_R, 90, 86.933524034)
            Line((-FILLET2_R * 0.0507054908644, -FILLET2_R * 0.946505444805), (-FILLET2_R * 0.0706768536878, -FILLET2_R * 0.945435553701))
            Line((-FILLET2_R * 0.0706768536878, -FILLET2_R * 0.945435553701), (-FILLET2_R * 0.0189572530062, FILLET2_R * 0.02))
            Line((-FILLET2_R * 0.0189572530062, FILLET2_R * 0.02), (FILLET2_R * 0.947862650308, FILLET2_R * 0.02))
            Line((FILLET2_R * 0.947862650308, FILLET2_R * 0.02), (FILLET2_R * 0.947862650308, 0))
        make_face()
    extrude(amount=12.7)
    with BuildSketch(Plane(origin=(303.849770217, -29.333853537, -6.35), x_dir=(-0.9480836055378152, 0.3180211894047567, 0), z_dir=(0, 0, 1))) as fillet2_piece_17:
        with BuildLine():
            CenterArc((FILLET2_R * 5.44993537278, FILLET2_R), FILLET2_R, 110.794908257, 159.205091743)
            Line((FILLET2_R * 5.09491148757, FILLET2_R * 1.93485723024), (FILLET2_R * 5.08781100986, FILLET2_R * 1.95355437484))
            Line((FILLET2_R * 5.08781100986, FILLET2_R * 1.95355437484), (-FILLET2_R * 0.00710047770437, FILLET2_R * 0.0186971446047))
            Line((-FILLET2_R * 0.00710047770437, FILLET2_R * 0.0186971446047), (0, -FILLET2_R * 0.02))
            Line((0, -FILLET2_R * 0.02), (FILLET2_R * 5.44993537278, -FILLET2_R * 0.02))
            Line((FILLET2_R * 5.44993537278, -FILLET2_R * 0.02), (FILLET2_R * 5.44993537278, 0))
        make_face()
    extrude(amount=12.7)
    with BuildSketch(Plane(origin=(-3.45918948, 195.777390763, 6.35), x_dir=(0.8128078399502832, -0.5825319006847222, 0), z_dir=(0, 0, -1))) as fillet2_piece_18:
        with BuildLine():
            CenterArc((1.769030238, 2.54), FILLET2_R, 204.706669887, 65.293330113)
            Line((-0.53845696, 1.478349007), (-0.584606704, 1.457115987))
            ThreePointArc((-0.584606704, 1.457115987), (-0.286667821, 0.732822597), (-0.048994959, -0.0134214))
            Line((-0.048994959, -0.0134214), (0, -0.0508))
            Line((0, -0.0508), (1.769030238, -0.0508))
            Line((1.769030238, -0.0508), (1.769030238, 0))
        make_face()
    extrude(amount=12.7)
    with BuildSketch(Plane(origin=(6.35884666, 188.740894591, 6.35), x_dir=(0, -1, 0), z_dir=(0, 0, -1))) as fillet2_piece_19:
        with BuildLine():
            CenterArc((FILLET2_R * 0.51361229407, FILLET2_R), FILLET2_R, 215.628820799, 54.371179201)
            Line((-FILLET2_R * 0.29919554588, FILLET2_R * 0.417468099315), (-FILLET2_R * 0.315451702679, FILLET2_R * 0.405817461302))
            Line((-FILLET2_R * 0.315451702679, FILLET2_R * 0.405817461302), (-FILLET2_R * 0.0102722458814, -FILLET2_R * 0.02))
            Line((-FILLET2_R * 0.0102722458814, -FILLET2_R * 0.02), (FILLET2_R * 0.51361229407, -FILLET2_R * 0.02))
            Line((FILLET2_R * 0.51361229407, -FILLET2_R * 0.02), (FILLET2_R * 0.51361229407, 0))
        make_face()
    extrude(amount=12.7)

    # Fillet3: read off the stored shape, not the designer's step
    # Fillet3 outline → Fillet3 (add)
    with SkipClean():  # the faces are left unmerged after this step: merging them gives an invalid solid
        with BuildSketch(Plane.XY.offset(FILLET3_START)):
            with BuildLine():
                Line((-1.019850221, 122.544452529), (3.74248631, 118.069012918))
                ThreePointArc((3.74248631, 118.069012918), (3.18755238, 121.009667849), (5.817406452, 122.43769819))
                Line((5.817406452, 122.43769819), (0.917086091, 123.090661347))
                ThreePointArc((0.917086091, 123.090661347), (-0.107785568, 123.017572006), (-1.019850221, 122.544452529))
            make_face()
        extrude(amount=FILLET3_DEPTH)


solid = part.part
